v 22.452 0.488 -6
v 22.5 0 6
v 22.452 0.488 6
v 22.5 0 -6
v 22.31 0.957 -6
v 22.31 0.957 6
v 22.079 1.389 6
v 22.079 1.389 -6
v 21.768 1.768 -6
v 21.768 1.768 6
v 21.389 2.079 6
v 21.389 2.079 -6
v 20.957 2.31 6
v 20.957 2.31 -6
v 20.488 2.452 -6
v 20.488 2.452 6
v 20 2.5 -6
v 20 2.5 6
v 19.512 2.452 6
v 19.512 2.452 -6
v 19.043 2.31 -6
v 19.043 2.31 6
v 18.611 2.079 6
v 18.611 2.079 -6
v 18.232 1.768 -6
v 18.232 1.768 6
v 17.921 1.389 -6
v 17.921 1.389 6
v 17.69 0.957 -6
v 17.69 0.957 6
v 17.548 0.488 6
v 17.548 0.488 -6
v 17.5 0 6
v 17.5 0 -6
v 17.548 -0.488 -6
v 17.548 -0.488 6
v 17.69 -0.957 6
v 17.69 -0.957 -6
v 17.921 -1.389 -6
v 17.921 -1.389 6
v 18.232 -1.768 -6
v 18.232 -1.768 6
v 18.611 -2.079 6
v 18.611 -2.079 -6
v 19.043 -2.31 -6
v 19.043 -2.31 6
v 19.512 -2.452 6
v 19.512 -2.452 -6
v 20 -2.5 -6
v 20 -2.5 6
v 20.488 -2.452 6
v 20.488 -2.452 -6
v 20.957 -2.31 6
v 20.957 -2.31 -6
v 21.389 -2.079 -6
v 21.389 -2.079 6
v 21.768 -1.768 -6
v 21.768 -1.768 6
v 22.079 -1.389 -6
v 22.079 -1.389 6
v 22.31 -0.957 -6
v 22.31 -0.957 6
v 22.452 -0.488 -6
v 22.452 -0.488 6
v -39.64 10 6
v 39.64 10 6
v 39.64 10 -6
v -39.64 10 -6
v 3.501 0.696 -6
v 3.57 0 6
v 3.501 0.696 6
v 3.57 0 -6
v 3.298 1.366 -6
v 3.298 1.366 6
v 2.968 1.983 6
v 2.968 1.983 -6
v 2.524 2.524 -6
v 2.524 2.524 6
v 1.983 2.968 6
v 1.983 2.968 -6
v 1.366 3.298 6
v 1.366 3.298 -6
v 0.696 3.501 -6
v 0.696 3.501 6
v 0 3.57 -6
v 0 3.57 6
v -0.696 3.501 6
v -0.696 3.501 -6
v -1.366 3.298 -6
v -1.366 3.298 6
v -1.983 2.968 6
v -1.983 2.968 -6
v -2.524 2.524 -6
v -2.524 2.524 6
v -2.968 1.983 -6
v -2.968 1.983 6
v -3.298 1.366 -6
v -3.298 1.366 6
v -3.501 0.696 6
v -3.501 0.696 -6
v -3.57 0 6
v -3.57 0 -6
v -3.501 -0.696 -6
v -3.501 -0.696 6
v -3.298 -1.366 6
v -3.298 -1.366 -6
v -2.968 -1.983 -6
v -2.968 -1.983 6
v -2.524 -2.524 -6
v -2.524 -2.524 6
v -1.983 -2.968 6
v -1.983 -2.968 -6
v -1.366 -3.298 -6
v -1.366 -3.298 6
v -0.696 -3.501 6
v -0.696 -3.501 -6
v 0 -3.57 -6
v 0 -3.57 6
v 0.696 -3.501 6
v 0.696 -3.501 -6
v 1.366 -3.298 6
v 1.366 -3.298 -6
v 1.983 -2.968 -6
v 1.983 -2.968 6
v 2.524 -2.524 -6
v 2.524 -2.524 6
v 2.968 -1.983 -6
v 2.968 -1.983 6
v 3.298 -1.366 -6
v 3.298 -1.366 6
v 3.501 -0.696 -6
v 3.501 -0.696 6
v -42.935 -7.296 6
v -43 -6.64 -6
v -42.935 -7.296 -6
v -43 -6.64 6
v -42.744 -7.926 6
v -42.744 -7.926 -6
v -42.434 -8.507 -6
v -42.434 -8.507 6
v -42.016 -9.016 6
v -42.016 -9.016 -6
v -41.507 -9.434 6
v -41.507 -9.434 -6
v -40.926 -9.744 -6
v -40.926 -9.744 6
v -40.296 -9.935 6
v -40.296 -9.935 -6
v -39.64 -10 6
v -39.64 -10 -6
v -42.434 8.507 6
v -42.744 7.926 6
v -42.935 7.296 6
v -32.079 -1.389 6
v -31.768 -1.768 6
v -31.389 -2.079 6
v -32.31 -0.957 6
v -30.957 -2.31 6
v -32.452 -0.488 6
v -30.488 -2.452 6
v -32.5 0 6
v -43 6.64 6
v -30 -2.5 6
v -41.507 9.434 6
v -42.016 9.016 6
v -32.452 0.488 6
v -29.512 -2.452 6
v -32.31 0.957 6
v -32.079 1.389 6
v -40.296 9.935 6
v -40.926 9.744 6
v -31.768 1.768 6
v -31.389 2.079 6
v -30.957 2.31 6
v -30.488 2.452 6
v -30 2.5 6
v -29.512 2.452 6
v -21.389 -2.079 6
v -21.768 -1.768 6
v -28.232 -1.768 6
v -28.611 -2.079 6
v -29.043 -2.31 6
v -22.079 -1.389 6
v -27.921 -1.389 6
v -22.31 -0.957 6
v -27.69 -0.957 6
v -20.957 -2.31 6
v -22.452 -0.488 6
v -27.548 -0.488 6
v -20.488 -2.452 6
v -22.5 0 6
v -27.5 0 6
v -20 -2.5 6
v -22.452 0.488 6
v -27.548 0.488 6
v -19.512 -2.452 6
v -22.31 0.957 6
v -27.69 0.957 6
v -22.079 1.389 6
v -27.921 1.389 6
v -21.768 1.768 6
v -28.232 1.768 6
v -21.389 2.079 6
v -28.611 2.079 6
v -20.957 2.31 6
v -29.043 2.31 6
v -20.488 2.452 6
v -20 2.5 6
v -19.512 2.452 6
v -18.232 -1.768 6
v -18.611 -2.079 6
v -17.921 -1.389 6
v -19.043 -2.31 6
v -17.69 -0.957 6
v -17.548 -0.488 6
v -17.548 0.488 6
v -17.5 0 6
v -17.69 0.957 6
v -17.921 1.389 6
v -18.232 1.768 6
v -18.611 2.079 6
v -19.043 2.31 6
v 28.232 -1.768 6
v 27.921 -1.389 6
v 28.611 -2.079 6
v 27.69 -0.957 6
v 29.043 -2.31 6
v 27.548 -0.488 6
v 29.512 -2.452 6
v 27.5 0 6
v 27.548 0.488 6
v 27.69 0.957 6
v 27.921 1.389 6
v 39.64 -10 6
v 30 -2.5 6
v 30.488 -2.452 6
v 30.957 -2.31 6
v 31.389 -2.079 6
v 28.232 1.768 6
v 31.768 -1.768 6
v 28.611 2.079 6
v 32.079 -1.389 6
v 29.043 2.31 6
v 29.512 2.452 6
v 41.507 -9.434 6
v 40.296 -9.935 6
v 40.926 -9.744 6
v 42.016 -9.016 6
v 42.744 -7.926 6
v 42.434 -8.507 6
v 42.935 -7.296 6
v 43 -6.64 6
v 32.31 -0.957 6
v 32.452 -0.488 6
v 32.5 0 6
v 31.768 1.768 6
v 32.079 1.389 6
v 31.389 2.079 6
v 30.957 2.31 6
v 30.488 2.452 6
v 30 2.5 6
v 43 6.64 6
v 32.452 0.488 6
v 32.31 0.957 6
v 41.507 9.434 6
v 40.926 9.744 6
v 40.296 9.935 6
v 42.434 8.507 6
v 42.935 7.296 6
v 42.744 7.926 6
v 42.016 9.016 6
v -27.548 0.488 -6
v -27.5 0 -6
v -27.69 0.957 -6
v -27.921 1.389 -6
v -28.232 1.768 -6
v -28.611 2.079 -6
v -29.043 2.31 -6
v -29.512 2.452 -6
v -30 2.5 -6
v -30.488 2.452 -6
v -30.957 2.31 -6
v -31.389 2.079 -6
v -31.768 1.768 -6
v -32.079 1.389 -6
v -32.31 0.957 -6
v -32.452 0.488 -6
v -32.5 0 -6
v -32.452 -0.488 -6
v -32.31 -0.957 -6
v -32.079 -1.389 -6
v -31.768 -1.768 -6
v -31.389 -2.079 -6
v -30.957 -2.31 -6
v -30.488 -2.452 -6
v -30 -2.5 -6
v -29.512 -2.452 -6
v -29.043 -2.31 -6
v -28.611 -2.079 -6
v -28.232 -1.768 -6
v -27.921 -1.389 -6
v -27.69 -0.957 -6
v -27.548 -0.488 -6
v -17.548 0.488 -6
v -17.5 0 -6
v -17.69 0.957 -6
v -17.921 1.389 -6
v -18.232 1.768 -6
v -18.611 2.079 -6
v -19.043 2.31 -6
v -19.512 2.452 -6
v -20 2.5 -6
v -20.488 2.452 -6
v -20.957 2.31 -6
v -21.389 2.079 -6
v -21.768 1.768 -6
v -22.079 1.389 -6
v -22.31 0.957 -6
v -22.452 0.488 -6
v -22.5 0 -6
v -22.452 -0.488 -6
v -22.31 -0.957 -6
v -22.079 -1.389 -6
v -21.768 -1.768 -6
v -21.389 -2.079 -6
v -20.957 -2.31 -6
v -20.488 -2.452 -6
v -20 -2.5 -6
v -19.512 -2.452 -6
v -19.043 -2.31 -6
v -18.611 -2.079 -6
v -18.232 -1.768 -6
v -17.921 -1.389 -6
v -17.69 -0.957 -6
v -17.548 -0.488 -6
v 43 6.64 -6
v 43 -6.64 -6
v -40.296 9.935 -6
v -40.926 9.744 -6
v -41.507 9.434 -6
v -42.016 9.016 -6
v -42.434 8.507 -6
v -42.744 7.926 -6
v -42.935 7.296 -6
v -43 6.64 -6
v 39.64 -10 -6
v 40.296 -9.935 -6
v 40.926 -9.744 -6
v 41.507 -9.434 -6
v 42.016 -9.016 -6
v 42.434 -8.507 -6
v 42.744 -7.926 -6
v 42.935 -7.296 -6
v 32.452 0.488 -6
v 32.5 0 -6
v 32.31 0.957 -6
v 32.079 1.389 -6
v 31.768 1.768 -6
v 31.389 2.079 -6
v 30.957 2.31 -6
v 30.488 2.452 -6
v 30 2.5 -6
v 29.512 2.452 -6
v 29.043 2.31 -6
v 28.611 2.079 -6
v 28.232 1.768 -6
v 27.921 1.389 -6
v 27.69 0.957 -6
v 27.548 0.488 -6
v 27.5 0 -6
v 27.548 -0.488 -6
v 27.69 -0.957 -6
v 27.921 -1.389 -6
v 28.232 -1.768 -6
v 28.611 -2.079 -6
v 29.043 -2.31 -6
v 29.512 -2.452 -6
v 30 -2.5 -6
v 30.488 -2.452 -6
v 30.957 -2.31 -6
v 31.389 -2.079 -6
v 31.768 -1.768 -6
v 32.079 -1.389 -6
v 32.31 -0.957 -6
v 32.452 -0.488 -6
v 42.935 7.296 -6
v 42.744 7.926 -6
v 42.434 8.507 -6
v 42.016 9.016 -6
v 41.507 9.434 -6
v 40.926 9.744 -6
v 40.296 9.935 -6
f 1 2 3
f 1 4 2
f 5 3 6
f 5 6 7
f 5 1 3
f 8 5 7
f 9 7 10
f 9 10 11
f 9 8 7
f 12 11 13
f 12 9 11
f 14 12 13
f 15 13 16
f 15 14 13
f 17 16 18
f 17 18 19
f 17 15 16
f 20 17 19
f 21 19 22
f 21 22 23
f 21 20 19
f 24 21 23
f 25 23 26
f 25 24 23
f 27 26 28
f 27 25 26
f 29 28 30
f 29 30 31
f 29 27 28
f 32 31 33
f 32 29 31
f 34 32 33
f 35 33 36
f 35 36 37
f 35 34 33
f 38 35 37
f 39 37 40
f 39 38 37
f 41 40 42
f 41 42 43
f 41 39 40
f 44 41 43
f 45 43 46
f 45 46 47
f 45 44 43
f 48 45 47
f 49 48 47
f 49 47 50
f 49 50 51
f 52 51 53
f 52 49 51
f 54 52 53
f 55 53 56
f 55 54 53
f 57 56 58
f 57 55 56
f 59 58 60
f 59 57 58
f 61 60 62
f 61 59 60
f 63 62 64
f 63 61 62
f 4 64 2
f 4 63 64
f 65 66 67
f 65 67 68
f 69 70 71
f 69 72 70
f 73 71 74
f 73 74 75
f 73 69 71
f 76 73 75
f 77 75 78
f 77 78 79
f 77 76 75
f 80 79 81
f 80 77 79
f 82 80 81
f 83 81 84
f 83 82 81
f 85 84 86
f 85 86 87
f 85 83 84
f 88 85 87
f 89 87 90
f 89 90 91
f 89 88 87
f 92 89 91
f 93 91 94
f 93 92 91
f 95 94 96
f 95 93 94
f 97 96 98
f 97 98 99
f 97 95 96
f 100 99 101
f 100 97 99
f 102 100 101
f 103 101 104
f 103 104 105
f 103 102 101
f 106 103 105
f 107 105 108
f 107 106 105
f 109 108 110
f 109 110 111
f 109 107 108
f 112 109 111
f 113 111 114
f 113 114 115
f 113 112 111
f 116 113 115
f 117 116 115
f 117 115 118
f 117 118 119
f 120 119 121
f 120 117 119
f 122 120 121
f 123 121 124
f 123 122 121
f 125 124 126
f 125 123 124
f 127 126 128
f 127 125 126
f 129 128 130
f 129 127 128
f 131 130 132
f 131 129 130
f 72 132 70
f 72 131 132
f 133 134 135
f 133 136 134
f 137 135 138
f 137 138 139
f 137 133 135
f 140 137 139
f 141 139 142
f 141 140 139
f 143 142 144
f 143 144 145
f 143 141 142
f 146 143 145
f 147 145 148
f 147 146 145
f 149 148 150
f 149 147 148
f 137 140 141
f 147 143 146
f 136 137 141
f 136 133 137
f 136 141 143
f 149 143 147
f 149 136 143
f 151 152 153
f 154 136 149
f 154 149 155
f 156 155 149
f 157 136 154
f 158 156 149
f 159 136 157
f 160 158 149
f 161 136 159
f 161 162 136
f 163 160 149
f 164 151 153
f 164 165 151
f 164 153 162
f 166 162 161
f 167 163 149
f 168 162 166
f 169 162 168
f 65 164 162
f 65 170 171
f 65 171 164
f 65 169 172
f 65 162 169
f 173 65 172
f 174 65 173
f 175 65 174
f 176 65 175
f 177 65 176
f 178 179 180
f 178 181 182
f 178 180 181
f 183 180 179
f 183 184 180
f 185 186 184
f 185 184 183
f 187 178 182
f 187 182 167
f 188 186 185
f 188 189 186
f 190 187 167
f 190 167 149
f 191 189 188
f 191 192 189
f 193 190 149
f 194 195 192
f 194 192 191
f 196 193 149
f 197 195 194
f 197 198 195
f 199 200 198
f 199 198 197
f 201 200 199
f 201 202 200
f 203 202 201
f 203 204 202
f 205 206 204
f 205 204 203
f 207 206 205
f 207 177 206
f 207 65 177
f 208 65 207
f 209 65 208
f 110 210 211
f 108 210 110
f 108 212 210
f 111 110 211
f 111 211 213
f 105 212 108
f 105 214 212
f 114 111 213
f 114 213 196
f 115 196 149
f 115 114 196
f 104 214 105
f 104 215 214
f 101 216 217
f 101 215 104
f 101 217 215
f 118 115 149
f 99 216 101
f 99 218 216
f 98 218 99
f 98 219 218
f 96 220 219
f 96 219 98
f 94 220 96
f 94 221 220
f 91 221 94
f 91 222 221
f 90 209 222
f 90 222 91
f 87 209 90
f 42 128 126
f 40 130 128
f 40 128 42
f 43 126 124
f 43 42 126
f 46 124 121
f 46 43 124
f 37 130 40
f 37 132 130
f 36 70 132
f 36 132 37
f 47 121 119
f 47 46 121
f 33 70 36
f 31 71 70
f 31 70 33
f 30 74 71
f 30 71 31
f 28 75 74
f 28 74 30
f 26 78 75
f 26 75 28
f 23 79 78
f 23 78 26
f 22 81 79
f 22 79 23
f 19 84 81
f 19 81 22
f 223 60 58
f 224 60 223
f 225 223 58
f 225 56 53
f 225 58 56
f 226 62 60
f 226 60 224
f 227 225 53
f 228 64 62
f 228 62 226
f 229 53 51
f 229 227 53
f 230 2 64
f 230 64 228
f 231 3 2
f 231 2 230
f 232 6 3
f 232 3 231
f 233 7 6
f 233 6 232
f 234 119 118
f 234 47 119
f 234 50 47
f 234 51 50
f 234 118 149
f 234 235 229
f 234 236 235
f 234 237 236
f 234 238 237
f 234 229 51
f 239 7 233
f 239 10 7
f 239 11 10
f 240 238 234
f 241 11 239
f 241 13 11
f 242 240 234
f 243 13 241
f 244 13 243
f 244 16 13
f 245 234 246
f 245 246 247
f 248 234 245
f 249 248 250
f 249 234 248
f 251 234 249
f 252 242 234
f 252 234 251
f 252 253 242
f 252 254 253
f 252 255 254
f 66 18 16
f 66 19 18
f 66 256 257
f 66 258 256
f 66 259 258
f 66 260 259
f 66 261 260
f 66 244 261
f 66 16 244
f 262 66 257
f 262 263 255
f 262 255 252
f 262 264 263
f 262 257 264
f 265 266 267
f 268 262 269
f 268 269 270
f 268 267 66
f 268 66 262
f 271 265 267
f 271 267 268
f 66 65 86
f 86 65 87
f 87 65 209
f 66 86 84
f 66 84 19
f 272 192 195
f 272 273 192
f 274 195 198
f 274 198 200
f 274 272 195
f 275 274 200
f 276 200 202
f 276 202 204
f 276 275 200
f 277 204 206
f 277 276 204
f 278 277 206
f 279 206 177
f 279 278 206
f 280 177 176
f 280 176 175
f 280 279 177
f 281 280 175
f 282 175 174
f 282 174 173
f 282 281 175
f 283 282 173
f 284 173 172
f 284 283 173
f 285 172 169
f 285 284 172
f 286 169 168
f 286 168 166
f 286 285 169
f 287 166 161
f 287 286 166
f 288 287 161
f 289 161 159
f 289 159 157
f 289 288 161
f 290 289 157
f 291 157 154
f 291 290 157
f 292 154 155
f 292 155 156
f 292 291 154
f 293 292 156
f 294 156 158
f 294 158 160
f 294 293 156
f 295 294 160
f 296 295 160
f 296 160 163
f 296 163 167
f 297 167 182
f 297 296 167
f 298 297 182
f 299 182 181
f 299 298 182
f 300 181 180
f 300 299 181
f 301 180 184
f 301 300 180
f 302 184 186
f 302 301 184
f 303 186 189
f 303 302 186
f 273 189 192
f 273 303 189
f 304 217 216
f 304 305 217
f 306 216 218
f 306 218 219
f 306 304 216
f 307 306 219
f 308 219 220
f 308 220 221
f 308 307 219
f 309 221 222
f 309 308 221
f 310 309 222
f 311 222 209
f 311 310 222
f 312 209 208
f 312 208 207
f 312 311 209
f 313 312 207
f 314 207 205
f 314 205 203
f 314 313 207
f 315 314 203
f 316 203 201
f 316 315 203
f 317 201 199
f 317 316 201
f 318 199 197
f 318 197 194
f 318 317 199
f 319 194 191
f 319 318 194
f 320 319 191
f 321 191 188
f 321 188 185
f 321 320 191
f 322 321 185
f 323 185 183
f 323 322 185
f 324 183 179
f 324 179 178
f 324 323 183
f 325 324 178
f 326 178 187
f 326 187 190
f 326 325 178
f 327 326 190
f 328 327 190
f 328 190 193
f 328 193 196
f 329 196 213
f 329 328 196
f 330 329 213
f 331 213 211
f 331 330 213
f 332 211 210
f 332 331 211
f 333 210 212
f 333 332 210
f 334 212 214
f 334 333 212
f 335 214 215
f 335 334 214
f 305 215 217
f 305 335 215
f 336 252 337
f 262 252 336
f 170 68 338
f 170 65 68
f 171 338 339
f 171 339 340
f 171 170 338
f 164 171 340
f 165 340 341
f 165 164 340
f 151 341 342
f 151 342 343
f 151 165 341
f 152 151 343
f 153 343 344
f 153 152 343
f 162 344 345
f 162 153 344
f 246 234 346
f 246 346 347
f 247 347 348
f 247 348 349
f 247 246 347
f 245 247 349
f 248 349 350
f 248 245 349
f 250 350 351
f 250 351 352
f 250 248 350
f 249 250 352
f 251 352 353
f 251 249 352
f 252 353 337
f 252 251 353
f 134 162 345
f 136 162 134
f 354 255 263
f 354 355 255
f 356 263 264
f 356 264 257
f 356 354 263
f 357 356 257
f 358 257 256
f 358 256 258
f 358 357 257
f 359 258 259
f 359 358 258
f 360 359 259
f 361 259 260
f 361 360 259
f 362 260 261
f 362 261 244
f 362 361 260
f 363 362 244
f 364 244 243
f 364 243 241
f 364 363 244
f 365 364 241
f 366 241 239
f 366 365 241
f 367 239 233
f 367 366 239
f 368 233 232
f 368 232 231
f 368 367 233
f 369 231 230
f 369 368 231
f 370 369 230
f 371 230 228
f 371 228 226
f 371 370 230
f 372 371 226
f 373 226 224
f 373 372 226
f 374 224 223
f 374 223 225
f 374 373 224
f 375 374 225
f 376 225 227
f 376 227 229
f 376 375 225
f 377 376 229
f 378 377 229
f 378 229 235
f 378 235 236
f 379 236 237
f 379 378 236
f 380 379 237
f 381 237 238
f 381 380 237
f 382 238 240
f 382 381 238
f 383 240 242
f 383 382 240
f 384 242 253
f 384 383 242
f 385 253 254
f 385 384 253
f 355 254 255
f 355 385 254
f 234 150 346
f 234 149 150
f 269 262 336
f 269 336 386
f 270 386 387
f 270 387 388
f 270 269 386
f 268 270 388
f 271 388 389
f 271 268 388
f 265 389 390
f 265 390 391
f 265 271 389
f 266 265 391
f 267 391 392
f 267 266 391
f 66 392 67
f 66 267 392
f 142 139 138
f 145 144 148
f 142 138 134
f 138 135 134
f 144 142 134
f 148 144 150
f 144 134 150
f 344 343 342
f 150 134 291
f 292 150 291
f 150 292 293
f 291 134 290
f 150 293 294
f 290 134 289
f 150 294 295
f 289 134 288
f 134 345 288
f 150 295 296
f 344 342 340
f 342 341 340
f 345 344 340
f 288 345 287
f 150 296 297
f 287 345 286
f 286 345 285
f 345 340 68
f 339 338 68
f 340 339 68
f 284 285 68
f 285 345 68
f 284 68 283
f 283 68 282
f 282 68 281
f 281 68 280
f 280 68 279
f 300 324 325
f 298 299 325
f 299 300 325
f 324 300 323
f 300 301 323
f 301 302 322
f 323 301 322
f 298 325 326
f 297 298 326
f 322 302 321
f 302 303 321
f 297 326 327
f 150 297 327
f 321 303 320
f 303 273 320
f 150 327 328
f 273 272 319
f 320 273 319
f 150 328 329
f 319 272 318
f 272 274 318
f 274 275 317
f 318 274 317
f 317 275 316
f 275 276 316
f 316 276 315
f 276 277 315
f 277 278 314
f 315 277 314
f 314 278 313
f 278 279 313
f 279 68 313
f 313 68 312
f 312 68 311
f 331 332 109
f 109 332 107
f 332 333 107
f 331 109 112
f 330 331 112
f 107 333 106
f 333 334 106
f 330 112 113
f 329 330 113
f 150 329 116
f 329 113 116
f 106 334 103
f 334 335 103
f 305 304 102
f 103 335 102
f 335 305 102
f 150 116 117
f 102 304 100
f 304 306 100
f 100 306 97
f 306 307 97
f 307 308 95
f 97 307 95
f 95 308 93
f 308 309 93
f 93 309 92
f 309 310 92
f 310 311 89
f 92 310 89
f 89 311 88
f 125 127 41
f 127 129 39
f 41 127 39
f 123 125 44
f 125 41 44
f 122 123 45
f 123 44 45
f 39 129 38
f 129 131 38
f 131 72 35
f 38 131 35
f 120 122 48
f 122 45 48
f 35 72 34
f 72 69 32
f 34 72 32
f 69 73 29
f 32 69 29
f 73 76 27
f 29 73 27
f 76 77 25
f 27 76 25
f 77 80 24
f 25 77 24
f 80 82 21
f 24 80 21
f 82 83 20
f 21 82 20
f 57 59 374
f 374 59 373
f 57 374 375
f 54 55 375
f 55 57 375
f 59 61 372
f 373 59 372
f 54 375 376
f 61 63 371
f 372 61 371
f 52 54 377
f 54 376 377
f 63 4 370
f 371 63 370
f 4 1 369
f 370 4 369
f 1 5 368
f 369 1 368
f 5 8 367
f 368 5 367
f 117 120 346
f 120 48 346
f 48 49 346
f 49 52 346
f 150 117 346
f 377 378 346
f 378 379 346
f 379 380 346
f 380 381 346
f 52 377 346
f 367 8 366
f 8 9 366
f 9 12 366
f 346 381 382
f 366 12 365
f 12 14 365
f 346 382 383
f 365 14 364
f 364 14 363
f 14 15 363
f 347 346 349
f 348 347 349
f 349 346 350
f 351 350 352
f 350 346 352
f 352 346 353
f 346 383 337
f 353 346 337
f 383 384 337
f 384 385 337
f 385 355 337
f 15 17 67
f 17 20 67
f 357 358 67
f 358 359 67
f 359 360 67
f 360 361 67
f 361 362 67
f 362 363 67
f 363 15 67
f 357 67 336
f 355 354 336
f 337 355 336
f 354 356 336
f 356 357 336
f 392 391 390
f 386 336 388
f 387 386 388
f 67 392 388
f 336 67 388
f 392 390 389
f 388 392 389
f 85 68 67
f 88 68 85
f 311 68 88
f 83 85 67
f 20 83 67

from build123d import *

# Parameters (mm, degrees)
SKETCH1_R           = 2.5
SKETCH1_R_2         = 3.57
BOSS_EXTRUDE1_DEPTH = 6


with BuildPart() as part:
    # Sketch1 → Boss-Extrude1 (new, symmetric)
    with BuildSketch(Plane.XY):
        with BuildLine():
            Line((-39.64, -10), (39.64, -10))
            ThreePointArc((39.64, -10), (42.015878785, -9.015878785), (43, -6.64))
            Line((43, -6.64), (43, 6.64))
            ThreePointArc((43, 6.64), (42.015878785, 9.015878785), (39.64, 10))
            Line((39.64, 10), (-39.64, 10))
            ThreePointArc((-39.64, 10), (-42.015878785, 9.015878785), (-43, 6.64))
            Line((-43, 6.64), (-43, -6.64))
            ThreePointArc((-43, -6.64), (-42.015878785, -9.015878785), (-39.64, -10))
        make_face()
        with Locations((-30, 0)):
            Circle(SKETCH1_R, mode=Mode.SUBTRACT)
        Circle(SKETCH1_R_2, mode=Mode.SUBTRACT)
        with Locations((30, 0)):
            Circle(SKETCH1_R, mode=Mode.SUBTRACT)
        with Locations((-20, 0)):
            Circle(SKETCH1_R, mode=Mode.SUBTRACT)
        with Locations((20, 0)):
            Circle(SKETCH1_R, mode=Mode.SUBTRACT)
    extrude(amount=BOSS_EXTRUDE1_DEPTH, both=True)


solid = part.part
